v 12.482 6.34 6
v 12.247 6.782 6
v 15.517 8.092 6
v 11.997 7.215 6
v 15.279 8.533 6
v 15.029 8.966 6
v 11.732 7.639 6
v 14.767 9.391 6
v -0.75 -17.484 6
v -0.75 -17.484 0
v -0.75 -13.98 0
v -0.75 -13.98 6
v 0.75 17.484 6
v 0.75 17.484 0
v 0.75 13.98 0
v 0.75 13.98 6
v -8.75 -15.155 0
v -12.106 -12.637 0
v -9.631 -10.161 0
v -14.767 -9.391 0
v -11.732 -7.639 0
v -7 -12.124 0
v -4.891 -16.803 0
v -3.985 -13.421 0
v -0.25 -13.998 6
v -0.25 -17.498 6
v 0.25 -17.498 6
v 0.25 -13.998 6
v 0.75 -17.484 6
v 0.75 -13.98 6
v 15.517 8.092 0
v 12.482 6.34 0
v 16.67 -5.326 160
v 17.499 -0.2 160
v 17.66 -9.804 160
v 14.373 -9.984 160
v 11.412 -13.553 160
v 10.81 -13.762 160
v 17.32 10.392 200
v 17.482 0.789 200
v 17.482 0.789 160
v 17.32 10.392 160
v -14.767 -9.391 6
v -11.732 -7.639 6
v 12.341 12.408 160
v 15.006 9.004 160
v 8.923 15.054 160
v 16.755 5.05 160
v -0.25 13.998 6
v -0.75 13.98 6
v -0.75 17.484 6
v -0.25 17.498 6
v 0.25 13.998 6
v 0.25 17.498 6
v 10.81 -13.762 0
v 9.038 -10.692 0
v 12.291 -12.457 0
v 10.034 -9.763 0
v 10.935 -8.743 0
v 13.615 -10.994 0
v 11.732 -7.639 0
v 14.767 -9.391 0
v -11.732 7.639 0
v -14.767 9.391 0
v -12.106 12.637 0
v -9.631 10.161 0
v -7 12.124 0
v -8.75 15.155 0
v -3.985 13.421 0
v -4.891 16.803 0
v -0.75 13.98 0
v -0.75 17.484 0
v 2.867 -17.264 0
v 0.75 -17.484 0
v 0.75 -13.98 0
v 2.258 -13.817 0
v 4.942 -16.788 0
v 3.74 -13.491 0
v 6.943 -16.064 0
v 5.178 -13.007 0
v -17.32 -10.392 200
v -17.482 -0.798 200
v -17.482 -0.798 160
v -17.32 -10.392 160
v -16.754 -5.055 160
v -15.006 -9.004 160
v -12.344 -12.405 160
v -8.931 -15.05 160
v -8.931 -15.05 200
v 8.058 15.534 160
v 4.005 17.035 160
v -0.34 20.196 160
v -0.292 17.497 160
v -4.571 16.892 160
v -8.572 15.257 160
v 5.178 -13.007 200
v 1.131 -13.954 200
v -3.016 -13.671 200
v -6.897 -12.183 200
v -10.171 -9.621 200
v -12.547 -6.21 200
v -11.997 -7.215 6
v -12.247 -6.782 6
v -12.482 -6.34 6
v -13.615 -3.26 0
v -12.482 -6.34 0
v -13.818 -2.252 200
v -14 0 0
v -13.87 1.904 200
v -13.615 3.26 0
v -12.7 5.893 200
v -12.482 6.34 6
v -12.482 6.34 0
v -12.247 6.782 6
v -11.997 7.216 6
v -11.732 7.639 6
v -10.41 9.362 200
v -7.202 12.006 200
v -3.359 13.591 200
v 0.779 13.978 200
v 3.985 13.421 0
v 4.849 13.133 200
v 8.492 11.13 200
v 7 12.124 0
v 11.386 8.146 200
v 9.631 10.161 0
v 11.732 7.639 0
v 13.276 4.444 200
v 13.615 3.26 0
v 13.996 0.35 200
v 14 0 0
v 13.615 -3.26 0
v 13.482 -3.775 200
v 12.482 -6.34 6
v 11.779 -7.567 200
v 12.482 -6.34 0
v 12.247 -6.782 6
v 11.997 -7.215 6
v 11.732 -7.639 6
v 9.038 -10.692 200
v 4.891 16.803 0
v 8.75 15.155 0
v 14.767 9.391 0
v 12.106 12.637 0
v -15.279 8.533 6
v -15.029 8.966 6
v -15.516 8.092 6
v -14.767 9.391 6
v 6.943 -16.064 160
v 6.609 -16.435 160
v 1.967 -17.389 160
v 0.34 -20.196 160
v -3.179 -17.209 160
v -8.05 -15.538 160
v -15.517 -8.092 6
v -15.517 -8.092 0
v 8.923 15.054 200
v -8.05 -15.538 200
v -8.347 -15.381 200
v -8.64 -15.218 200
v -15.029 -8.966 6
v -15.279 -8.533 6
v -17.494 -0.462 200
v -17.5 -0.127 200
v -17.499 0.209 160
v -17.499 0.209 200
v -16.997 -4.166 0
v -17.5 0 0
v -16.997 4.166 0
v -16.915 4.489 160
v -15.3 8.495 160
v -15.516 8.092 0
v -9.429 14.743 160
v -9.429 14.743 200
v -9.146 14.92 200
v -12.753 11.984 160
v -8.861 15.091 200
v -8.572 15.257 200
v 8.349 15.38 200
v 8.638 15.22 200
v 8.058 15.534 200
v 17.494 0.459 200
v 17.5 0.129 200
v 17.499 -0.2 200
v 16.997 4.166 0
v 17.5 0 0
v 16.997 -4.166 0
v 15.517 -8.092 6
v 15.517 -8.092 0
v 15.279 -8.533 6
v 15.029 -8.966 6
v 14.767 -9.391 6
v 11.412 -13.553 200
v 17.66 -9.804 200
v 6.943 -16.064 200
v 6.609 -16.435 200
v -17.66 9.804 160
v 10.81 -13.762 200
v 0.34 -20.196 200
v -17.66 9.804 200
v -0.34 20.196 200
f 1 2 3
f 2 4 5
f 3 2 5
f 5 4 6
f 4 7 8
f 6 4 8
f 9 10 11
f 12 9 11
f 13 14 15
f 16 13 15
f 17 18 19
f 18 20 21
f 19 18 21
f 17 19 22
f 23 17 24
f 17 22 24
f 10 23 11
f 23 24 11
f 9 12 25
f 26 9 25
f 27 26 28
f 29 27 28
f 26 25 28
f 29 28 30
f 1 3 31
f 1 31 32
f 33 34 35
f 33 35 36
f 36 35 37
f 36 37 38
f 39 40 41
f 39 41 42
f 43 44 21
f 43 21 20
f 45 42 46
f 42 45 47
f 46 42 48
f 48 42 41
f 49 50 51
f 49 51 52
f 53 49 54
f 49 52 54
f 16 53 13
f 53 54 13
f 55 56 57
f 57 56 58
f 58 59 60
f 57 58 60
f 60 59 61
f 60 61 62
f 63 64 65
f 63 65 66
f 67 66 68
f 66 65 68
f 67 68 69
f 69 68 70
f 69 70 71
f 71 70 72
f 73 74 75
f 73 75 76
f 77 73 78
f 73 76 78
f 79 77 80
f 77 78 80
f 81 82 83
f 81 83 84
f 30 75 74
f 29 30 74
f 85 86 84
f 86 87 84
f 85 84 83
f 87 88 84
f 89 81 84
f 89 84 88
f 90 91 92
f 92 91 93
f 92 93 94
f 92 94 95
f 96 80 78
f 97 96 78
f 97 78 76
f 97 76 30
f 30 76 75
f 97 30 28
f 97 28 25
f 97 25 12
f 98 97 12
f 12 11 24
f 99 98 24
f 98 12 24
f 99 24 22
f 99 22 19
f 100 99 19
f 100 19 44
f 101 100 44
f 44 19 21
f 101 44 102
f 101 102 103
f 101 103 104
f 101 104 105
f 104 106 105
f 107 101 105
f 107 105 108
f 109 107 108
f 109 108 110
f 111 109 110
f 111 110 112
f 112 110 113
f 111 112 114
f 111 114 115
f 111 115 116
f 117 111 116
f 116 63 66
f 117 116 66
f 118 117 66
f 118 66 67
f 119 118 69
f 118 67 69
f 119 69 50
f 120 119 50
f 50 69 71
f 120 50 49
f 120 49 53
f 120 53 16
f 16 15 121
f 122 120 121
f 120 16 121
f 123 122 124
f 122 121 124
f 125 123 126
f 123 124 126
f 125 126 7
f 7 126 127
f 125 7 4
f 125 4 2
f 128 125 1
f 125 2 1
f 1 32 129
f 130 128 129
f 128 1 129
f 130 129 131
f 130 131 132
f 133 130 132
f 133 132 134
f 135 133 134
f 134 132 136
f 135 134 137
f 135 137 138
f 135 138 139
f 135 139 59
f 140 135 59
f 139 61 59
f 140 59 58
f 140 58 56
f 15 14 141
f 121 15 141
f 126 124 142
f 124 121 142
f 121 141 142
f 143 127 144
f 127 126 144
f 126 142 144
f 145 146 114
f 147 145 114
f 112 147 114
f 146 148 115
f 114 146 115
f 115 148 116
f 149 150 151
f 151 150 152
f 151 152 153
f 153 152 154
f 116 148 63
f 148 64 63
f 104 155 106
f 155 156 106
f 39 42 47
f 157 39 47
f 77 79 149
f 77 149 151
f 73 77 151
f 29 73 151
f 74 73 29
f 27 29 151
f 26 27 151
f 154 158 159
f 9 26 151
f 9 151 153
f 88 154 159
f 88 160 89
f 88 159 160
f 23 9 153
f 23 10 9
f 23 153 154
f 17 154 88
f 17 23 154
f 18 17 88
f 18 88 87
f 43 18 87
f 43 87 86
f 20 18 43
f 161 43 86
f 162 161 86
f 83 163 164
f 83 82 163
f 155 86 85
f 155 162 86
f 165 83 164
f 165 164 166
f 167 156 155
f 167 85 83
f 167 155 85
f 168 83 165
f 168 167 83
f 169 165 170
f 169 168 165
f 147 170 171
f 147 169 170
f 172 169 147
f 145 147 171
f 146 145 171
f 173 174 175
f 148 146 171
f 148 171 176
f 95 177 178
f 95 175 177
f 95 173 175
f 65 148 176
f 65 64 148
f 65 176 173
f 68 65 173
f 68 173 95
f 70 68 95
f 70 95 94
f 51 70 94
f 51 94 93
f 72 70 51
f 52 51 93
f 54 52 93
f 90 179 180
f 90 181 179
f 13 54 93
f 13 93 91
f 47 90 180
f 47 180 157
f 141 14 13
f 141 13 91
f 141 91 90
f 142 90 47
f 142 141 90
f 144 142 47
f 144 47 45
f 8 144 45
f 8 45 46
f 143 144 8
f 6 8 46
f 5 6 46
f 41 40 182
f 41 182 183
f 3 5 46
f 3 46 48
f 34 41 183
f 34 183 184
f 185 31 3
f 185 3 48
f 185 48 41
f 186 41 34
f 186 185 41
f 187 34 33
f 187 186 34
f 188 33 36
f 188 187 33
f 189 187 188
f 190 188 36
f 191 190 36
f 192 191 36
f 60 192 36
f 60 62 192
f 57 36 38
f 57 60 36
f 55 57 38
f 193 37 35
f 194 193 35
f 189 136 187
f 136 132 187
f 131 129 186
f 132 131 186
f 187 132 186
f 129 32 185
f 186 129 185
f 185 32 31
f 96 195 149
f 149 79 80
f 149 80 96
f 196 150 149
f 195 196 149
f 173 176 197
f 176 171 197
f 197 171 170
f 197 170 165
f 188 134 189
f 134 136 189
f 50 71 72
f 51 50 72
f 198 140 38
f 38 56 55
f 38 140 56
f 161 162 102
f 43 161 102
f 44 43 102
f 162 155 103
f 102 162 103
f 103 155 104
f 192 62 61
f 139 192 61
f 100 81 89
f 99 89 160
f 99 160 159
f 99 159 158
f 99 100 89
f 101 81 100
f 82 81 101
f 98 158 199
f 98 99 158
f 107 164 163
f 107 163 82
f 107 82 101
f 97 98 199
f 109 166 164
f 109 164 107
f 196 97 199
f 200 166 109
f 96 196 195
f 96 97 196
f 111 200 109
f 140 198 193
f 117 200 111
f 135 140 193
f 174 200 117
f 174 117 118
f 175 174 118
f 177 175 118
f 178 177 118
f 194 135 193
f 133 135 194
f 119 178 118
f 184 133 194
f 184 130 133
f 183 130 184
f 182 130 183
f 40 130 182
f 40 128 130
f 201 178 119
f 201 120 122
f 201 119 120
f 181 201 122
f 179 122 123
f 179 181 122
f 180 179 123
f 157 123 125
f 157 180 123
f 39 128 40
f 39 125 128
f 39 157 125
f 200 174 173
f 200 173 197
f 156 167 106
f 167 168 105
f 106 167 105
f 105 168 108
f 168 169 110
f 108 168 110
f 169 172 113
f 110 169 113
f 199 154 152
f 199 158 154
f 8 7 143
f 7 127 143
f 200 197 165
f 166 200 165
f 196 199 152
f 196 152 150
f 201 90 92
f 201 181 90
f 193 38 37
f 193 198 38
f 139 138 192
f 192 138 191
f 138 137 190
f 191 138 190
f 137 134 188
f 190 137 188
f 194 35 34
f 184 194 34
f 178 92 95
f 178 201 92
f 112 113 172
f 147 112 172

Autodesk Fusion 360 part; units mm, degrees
sketch "Sketch1" plane through (0, 0, 0) normal (0, 0, 1) x (1, 0, 0)
  circle A0 centre (0, 0) radius 10
  dimension "d1" = 20
sketch "Sketch2" plane through (0, 0, 0) normal (0, 0, 1) x (1, 0, 0)
  circle A0 centre (0, 0) radius 17.5
  circle A1 centre (0, 0) radius 14
  line L0 (-0.75, 19.1081) -> (0.75, 19.1081)
  line L1 (0.75, 19.1081) -> (0.75, -21)
  line L2 (0.75, -21) -> (-0.75, -21)
  line L3 (-0.75, -21) -> (-0.75, 19.1081)
  line L4 (0, 23) -> (0, -27)
  line L5 (-30, 0) -> (27, 0)
  line L6 (-16.3017, -8.5458) -> (18.0876, 11.3089)
  line L7 (18.0876, 11.3089) -> (18.8376, 10.0099)
  line L8 (18.8376, 10.0099) -> (-15.5517, -9.8448)
  line L9 (-15.5517, -9.8448) -> (-16.3017, -8.5458)
  line L10 (-16.8985, 10.6224) -> (17.4908, -9.2323)
  line L11 (17.4908, -9.2323) -> (16.7408, -10.5313)
  line L12 (16.7408, -10.5313) -> (-17.6485, 9.3234)
  line L13 (-17.6485, 9.3234) -> (-16.8985, 10.6224)
  line L14 (8.0661, -18.0086) -> (4.1738, -11.2669)
  line L15 (4.1738, -11.2669) -> (8.0709, -9.0169)
  line L16 (8.0709, -9.0169) -> (11.9633, -15.7586)
  line L17 (11.9633, -15.7586) -> (8.0661, -18.0086)
  dimension "d2" = 35
  dimension "d3" = 28
  dimension "d4" = 1.5
  dimension "d5" = 0.75
  dimension "d7" = 1.5
  dimension "d8" = 120
  dimension "d9" = 0.75
  dimension "d10" = 1.5
  dimension "d11" = 60
  dimension "d16" = 4.5
  dimension "d17" = 30
  dimension "d19" = 0.75
extrude "Extrude1" add sketch "Sketch2" along normal blind 200 contours A0 A1 L5 L8 | A0 A1 L5 L10 | A0 A1 L6 L8 | A0 A1 L10 L12 | A0 A1 L1 L6 | A0 A1 L12 L16 | A0 A1 L1 L4 | A0 A1 L3 L4 | A0 A1 L1 L14 | A0 A1 L3 L10 | A0 A1 L1 L4 | A0 A1 L3 L4 | A0 A1 L10 L12 | A0 A1 L3 L8 | A0 A1 L6 L8 | A0 A1 L5 L12 | A0 A1 L5 L6
extrude "Extrude2" cut sketch "Sketch2" along normal blind 6 contours A0 A1 L6 L8 | A0 A1 L10 L12 | A0 A1 L1 L4 | A0 A1 L3 L4 | A0 A1 L1 L4 | A0 A1 L3 L4 | A0 A1 L10 L12 | A0 A1 L6 L8
sketch "Sketch3" plane through (0, 0, 200) normal (0, 0, 1) x (-1, 0, 0)
  arc A0 (-10.8104, 13.7617) -> (-6.9432, 16.0637) centre (0, 0) ccw
  line L0 (-6.9432, 16.0637) -> (-5.1785, 13.007)
  arc A1 (-9.038, 10.6918) -> (-5.1785, 13.007) centre (0, 0) ccw
  line L1 (-9.038, 10.6918) -> (-10.8104, 13.7617)
  line L2 (-17.6603, 9.8038) -> (-17.3205, -10.3923)
  line L3 (-17.3205, -10.3923) -> (0.3397, -20.1962)
  line L4 (0.3397, -20.1962) -> (17.6603, -9.8038)
  line L5 (17.6603, -9.8038) -> (17.3205, 10.3923)
  line L6 (17.3205, 10.3923) -> (-0.3397, 20.1962)
  line L7 (-0.3397, 20.1962) -> (-17.6603, 9.8038)
  line L8 (-6.6088, 16.4347) -> (-6.9432, 16.0637)
  line L9 (-10.8104, 13.7617) -> (-11.4119, 13.5528)
extrude "Extrude3" add sketch "Sketch3" against normal blind 40 contours A0 L2 L7 L9 | A0 L2 L3 | A0 L6 L7 L8 | A0 L3 L4 | A0 L5 L6 | A0 L4 L5
